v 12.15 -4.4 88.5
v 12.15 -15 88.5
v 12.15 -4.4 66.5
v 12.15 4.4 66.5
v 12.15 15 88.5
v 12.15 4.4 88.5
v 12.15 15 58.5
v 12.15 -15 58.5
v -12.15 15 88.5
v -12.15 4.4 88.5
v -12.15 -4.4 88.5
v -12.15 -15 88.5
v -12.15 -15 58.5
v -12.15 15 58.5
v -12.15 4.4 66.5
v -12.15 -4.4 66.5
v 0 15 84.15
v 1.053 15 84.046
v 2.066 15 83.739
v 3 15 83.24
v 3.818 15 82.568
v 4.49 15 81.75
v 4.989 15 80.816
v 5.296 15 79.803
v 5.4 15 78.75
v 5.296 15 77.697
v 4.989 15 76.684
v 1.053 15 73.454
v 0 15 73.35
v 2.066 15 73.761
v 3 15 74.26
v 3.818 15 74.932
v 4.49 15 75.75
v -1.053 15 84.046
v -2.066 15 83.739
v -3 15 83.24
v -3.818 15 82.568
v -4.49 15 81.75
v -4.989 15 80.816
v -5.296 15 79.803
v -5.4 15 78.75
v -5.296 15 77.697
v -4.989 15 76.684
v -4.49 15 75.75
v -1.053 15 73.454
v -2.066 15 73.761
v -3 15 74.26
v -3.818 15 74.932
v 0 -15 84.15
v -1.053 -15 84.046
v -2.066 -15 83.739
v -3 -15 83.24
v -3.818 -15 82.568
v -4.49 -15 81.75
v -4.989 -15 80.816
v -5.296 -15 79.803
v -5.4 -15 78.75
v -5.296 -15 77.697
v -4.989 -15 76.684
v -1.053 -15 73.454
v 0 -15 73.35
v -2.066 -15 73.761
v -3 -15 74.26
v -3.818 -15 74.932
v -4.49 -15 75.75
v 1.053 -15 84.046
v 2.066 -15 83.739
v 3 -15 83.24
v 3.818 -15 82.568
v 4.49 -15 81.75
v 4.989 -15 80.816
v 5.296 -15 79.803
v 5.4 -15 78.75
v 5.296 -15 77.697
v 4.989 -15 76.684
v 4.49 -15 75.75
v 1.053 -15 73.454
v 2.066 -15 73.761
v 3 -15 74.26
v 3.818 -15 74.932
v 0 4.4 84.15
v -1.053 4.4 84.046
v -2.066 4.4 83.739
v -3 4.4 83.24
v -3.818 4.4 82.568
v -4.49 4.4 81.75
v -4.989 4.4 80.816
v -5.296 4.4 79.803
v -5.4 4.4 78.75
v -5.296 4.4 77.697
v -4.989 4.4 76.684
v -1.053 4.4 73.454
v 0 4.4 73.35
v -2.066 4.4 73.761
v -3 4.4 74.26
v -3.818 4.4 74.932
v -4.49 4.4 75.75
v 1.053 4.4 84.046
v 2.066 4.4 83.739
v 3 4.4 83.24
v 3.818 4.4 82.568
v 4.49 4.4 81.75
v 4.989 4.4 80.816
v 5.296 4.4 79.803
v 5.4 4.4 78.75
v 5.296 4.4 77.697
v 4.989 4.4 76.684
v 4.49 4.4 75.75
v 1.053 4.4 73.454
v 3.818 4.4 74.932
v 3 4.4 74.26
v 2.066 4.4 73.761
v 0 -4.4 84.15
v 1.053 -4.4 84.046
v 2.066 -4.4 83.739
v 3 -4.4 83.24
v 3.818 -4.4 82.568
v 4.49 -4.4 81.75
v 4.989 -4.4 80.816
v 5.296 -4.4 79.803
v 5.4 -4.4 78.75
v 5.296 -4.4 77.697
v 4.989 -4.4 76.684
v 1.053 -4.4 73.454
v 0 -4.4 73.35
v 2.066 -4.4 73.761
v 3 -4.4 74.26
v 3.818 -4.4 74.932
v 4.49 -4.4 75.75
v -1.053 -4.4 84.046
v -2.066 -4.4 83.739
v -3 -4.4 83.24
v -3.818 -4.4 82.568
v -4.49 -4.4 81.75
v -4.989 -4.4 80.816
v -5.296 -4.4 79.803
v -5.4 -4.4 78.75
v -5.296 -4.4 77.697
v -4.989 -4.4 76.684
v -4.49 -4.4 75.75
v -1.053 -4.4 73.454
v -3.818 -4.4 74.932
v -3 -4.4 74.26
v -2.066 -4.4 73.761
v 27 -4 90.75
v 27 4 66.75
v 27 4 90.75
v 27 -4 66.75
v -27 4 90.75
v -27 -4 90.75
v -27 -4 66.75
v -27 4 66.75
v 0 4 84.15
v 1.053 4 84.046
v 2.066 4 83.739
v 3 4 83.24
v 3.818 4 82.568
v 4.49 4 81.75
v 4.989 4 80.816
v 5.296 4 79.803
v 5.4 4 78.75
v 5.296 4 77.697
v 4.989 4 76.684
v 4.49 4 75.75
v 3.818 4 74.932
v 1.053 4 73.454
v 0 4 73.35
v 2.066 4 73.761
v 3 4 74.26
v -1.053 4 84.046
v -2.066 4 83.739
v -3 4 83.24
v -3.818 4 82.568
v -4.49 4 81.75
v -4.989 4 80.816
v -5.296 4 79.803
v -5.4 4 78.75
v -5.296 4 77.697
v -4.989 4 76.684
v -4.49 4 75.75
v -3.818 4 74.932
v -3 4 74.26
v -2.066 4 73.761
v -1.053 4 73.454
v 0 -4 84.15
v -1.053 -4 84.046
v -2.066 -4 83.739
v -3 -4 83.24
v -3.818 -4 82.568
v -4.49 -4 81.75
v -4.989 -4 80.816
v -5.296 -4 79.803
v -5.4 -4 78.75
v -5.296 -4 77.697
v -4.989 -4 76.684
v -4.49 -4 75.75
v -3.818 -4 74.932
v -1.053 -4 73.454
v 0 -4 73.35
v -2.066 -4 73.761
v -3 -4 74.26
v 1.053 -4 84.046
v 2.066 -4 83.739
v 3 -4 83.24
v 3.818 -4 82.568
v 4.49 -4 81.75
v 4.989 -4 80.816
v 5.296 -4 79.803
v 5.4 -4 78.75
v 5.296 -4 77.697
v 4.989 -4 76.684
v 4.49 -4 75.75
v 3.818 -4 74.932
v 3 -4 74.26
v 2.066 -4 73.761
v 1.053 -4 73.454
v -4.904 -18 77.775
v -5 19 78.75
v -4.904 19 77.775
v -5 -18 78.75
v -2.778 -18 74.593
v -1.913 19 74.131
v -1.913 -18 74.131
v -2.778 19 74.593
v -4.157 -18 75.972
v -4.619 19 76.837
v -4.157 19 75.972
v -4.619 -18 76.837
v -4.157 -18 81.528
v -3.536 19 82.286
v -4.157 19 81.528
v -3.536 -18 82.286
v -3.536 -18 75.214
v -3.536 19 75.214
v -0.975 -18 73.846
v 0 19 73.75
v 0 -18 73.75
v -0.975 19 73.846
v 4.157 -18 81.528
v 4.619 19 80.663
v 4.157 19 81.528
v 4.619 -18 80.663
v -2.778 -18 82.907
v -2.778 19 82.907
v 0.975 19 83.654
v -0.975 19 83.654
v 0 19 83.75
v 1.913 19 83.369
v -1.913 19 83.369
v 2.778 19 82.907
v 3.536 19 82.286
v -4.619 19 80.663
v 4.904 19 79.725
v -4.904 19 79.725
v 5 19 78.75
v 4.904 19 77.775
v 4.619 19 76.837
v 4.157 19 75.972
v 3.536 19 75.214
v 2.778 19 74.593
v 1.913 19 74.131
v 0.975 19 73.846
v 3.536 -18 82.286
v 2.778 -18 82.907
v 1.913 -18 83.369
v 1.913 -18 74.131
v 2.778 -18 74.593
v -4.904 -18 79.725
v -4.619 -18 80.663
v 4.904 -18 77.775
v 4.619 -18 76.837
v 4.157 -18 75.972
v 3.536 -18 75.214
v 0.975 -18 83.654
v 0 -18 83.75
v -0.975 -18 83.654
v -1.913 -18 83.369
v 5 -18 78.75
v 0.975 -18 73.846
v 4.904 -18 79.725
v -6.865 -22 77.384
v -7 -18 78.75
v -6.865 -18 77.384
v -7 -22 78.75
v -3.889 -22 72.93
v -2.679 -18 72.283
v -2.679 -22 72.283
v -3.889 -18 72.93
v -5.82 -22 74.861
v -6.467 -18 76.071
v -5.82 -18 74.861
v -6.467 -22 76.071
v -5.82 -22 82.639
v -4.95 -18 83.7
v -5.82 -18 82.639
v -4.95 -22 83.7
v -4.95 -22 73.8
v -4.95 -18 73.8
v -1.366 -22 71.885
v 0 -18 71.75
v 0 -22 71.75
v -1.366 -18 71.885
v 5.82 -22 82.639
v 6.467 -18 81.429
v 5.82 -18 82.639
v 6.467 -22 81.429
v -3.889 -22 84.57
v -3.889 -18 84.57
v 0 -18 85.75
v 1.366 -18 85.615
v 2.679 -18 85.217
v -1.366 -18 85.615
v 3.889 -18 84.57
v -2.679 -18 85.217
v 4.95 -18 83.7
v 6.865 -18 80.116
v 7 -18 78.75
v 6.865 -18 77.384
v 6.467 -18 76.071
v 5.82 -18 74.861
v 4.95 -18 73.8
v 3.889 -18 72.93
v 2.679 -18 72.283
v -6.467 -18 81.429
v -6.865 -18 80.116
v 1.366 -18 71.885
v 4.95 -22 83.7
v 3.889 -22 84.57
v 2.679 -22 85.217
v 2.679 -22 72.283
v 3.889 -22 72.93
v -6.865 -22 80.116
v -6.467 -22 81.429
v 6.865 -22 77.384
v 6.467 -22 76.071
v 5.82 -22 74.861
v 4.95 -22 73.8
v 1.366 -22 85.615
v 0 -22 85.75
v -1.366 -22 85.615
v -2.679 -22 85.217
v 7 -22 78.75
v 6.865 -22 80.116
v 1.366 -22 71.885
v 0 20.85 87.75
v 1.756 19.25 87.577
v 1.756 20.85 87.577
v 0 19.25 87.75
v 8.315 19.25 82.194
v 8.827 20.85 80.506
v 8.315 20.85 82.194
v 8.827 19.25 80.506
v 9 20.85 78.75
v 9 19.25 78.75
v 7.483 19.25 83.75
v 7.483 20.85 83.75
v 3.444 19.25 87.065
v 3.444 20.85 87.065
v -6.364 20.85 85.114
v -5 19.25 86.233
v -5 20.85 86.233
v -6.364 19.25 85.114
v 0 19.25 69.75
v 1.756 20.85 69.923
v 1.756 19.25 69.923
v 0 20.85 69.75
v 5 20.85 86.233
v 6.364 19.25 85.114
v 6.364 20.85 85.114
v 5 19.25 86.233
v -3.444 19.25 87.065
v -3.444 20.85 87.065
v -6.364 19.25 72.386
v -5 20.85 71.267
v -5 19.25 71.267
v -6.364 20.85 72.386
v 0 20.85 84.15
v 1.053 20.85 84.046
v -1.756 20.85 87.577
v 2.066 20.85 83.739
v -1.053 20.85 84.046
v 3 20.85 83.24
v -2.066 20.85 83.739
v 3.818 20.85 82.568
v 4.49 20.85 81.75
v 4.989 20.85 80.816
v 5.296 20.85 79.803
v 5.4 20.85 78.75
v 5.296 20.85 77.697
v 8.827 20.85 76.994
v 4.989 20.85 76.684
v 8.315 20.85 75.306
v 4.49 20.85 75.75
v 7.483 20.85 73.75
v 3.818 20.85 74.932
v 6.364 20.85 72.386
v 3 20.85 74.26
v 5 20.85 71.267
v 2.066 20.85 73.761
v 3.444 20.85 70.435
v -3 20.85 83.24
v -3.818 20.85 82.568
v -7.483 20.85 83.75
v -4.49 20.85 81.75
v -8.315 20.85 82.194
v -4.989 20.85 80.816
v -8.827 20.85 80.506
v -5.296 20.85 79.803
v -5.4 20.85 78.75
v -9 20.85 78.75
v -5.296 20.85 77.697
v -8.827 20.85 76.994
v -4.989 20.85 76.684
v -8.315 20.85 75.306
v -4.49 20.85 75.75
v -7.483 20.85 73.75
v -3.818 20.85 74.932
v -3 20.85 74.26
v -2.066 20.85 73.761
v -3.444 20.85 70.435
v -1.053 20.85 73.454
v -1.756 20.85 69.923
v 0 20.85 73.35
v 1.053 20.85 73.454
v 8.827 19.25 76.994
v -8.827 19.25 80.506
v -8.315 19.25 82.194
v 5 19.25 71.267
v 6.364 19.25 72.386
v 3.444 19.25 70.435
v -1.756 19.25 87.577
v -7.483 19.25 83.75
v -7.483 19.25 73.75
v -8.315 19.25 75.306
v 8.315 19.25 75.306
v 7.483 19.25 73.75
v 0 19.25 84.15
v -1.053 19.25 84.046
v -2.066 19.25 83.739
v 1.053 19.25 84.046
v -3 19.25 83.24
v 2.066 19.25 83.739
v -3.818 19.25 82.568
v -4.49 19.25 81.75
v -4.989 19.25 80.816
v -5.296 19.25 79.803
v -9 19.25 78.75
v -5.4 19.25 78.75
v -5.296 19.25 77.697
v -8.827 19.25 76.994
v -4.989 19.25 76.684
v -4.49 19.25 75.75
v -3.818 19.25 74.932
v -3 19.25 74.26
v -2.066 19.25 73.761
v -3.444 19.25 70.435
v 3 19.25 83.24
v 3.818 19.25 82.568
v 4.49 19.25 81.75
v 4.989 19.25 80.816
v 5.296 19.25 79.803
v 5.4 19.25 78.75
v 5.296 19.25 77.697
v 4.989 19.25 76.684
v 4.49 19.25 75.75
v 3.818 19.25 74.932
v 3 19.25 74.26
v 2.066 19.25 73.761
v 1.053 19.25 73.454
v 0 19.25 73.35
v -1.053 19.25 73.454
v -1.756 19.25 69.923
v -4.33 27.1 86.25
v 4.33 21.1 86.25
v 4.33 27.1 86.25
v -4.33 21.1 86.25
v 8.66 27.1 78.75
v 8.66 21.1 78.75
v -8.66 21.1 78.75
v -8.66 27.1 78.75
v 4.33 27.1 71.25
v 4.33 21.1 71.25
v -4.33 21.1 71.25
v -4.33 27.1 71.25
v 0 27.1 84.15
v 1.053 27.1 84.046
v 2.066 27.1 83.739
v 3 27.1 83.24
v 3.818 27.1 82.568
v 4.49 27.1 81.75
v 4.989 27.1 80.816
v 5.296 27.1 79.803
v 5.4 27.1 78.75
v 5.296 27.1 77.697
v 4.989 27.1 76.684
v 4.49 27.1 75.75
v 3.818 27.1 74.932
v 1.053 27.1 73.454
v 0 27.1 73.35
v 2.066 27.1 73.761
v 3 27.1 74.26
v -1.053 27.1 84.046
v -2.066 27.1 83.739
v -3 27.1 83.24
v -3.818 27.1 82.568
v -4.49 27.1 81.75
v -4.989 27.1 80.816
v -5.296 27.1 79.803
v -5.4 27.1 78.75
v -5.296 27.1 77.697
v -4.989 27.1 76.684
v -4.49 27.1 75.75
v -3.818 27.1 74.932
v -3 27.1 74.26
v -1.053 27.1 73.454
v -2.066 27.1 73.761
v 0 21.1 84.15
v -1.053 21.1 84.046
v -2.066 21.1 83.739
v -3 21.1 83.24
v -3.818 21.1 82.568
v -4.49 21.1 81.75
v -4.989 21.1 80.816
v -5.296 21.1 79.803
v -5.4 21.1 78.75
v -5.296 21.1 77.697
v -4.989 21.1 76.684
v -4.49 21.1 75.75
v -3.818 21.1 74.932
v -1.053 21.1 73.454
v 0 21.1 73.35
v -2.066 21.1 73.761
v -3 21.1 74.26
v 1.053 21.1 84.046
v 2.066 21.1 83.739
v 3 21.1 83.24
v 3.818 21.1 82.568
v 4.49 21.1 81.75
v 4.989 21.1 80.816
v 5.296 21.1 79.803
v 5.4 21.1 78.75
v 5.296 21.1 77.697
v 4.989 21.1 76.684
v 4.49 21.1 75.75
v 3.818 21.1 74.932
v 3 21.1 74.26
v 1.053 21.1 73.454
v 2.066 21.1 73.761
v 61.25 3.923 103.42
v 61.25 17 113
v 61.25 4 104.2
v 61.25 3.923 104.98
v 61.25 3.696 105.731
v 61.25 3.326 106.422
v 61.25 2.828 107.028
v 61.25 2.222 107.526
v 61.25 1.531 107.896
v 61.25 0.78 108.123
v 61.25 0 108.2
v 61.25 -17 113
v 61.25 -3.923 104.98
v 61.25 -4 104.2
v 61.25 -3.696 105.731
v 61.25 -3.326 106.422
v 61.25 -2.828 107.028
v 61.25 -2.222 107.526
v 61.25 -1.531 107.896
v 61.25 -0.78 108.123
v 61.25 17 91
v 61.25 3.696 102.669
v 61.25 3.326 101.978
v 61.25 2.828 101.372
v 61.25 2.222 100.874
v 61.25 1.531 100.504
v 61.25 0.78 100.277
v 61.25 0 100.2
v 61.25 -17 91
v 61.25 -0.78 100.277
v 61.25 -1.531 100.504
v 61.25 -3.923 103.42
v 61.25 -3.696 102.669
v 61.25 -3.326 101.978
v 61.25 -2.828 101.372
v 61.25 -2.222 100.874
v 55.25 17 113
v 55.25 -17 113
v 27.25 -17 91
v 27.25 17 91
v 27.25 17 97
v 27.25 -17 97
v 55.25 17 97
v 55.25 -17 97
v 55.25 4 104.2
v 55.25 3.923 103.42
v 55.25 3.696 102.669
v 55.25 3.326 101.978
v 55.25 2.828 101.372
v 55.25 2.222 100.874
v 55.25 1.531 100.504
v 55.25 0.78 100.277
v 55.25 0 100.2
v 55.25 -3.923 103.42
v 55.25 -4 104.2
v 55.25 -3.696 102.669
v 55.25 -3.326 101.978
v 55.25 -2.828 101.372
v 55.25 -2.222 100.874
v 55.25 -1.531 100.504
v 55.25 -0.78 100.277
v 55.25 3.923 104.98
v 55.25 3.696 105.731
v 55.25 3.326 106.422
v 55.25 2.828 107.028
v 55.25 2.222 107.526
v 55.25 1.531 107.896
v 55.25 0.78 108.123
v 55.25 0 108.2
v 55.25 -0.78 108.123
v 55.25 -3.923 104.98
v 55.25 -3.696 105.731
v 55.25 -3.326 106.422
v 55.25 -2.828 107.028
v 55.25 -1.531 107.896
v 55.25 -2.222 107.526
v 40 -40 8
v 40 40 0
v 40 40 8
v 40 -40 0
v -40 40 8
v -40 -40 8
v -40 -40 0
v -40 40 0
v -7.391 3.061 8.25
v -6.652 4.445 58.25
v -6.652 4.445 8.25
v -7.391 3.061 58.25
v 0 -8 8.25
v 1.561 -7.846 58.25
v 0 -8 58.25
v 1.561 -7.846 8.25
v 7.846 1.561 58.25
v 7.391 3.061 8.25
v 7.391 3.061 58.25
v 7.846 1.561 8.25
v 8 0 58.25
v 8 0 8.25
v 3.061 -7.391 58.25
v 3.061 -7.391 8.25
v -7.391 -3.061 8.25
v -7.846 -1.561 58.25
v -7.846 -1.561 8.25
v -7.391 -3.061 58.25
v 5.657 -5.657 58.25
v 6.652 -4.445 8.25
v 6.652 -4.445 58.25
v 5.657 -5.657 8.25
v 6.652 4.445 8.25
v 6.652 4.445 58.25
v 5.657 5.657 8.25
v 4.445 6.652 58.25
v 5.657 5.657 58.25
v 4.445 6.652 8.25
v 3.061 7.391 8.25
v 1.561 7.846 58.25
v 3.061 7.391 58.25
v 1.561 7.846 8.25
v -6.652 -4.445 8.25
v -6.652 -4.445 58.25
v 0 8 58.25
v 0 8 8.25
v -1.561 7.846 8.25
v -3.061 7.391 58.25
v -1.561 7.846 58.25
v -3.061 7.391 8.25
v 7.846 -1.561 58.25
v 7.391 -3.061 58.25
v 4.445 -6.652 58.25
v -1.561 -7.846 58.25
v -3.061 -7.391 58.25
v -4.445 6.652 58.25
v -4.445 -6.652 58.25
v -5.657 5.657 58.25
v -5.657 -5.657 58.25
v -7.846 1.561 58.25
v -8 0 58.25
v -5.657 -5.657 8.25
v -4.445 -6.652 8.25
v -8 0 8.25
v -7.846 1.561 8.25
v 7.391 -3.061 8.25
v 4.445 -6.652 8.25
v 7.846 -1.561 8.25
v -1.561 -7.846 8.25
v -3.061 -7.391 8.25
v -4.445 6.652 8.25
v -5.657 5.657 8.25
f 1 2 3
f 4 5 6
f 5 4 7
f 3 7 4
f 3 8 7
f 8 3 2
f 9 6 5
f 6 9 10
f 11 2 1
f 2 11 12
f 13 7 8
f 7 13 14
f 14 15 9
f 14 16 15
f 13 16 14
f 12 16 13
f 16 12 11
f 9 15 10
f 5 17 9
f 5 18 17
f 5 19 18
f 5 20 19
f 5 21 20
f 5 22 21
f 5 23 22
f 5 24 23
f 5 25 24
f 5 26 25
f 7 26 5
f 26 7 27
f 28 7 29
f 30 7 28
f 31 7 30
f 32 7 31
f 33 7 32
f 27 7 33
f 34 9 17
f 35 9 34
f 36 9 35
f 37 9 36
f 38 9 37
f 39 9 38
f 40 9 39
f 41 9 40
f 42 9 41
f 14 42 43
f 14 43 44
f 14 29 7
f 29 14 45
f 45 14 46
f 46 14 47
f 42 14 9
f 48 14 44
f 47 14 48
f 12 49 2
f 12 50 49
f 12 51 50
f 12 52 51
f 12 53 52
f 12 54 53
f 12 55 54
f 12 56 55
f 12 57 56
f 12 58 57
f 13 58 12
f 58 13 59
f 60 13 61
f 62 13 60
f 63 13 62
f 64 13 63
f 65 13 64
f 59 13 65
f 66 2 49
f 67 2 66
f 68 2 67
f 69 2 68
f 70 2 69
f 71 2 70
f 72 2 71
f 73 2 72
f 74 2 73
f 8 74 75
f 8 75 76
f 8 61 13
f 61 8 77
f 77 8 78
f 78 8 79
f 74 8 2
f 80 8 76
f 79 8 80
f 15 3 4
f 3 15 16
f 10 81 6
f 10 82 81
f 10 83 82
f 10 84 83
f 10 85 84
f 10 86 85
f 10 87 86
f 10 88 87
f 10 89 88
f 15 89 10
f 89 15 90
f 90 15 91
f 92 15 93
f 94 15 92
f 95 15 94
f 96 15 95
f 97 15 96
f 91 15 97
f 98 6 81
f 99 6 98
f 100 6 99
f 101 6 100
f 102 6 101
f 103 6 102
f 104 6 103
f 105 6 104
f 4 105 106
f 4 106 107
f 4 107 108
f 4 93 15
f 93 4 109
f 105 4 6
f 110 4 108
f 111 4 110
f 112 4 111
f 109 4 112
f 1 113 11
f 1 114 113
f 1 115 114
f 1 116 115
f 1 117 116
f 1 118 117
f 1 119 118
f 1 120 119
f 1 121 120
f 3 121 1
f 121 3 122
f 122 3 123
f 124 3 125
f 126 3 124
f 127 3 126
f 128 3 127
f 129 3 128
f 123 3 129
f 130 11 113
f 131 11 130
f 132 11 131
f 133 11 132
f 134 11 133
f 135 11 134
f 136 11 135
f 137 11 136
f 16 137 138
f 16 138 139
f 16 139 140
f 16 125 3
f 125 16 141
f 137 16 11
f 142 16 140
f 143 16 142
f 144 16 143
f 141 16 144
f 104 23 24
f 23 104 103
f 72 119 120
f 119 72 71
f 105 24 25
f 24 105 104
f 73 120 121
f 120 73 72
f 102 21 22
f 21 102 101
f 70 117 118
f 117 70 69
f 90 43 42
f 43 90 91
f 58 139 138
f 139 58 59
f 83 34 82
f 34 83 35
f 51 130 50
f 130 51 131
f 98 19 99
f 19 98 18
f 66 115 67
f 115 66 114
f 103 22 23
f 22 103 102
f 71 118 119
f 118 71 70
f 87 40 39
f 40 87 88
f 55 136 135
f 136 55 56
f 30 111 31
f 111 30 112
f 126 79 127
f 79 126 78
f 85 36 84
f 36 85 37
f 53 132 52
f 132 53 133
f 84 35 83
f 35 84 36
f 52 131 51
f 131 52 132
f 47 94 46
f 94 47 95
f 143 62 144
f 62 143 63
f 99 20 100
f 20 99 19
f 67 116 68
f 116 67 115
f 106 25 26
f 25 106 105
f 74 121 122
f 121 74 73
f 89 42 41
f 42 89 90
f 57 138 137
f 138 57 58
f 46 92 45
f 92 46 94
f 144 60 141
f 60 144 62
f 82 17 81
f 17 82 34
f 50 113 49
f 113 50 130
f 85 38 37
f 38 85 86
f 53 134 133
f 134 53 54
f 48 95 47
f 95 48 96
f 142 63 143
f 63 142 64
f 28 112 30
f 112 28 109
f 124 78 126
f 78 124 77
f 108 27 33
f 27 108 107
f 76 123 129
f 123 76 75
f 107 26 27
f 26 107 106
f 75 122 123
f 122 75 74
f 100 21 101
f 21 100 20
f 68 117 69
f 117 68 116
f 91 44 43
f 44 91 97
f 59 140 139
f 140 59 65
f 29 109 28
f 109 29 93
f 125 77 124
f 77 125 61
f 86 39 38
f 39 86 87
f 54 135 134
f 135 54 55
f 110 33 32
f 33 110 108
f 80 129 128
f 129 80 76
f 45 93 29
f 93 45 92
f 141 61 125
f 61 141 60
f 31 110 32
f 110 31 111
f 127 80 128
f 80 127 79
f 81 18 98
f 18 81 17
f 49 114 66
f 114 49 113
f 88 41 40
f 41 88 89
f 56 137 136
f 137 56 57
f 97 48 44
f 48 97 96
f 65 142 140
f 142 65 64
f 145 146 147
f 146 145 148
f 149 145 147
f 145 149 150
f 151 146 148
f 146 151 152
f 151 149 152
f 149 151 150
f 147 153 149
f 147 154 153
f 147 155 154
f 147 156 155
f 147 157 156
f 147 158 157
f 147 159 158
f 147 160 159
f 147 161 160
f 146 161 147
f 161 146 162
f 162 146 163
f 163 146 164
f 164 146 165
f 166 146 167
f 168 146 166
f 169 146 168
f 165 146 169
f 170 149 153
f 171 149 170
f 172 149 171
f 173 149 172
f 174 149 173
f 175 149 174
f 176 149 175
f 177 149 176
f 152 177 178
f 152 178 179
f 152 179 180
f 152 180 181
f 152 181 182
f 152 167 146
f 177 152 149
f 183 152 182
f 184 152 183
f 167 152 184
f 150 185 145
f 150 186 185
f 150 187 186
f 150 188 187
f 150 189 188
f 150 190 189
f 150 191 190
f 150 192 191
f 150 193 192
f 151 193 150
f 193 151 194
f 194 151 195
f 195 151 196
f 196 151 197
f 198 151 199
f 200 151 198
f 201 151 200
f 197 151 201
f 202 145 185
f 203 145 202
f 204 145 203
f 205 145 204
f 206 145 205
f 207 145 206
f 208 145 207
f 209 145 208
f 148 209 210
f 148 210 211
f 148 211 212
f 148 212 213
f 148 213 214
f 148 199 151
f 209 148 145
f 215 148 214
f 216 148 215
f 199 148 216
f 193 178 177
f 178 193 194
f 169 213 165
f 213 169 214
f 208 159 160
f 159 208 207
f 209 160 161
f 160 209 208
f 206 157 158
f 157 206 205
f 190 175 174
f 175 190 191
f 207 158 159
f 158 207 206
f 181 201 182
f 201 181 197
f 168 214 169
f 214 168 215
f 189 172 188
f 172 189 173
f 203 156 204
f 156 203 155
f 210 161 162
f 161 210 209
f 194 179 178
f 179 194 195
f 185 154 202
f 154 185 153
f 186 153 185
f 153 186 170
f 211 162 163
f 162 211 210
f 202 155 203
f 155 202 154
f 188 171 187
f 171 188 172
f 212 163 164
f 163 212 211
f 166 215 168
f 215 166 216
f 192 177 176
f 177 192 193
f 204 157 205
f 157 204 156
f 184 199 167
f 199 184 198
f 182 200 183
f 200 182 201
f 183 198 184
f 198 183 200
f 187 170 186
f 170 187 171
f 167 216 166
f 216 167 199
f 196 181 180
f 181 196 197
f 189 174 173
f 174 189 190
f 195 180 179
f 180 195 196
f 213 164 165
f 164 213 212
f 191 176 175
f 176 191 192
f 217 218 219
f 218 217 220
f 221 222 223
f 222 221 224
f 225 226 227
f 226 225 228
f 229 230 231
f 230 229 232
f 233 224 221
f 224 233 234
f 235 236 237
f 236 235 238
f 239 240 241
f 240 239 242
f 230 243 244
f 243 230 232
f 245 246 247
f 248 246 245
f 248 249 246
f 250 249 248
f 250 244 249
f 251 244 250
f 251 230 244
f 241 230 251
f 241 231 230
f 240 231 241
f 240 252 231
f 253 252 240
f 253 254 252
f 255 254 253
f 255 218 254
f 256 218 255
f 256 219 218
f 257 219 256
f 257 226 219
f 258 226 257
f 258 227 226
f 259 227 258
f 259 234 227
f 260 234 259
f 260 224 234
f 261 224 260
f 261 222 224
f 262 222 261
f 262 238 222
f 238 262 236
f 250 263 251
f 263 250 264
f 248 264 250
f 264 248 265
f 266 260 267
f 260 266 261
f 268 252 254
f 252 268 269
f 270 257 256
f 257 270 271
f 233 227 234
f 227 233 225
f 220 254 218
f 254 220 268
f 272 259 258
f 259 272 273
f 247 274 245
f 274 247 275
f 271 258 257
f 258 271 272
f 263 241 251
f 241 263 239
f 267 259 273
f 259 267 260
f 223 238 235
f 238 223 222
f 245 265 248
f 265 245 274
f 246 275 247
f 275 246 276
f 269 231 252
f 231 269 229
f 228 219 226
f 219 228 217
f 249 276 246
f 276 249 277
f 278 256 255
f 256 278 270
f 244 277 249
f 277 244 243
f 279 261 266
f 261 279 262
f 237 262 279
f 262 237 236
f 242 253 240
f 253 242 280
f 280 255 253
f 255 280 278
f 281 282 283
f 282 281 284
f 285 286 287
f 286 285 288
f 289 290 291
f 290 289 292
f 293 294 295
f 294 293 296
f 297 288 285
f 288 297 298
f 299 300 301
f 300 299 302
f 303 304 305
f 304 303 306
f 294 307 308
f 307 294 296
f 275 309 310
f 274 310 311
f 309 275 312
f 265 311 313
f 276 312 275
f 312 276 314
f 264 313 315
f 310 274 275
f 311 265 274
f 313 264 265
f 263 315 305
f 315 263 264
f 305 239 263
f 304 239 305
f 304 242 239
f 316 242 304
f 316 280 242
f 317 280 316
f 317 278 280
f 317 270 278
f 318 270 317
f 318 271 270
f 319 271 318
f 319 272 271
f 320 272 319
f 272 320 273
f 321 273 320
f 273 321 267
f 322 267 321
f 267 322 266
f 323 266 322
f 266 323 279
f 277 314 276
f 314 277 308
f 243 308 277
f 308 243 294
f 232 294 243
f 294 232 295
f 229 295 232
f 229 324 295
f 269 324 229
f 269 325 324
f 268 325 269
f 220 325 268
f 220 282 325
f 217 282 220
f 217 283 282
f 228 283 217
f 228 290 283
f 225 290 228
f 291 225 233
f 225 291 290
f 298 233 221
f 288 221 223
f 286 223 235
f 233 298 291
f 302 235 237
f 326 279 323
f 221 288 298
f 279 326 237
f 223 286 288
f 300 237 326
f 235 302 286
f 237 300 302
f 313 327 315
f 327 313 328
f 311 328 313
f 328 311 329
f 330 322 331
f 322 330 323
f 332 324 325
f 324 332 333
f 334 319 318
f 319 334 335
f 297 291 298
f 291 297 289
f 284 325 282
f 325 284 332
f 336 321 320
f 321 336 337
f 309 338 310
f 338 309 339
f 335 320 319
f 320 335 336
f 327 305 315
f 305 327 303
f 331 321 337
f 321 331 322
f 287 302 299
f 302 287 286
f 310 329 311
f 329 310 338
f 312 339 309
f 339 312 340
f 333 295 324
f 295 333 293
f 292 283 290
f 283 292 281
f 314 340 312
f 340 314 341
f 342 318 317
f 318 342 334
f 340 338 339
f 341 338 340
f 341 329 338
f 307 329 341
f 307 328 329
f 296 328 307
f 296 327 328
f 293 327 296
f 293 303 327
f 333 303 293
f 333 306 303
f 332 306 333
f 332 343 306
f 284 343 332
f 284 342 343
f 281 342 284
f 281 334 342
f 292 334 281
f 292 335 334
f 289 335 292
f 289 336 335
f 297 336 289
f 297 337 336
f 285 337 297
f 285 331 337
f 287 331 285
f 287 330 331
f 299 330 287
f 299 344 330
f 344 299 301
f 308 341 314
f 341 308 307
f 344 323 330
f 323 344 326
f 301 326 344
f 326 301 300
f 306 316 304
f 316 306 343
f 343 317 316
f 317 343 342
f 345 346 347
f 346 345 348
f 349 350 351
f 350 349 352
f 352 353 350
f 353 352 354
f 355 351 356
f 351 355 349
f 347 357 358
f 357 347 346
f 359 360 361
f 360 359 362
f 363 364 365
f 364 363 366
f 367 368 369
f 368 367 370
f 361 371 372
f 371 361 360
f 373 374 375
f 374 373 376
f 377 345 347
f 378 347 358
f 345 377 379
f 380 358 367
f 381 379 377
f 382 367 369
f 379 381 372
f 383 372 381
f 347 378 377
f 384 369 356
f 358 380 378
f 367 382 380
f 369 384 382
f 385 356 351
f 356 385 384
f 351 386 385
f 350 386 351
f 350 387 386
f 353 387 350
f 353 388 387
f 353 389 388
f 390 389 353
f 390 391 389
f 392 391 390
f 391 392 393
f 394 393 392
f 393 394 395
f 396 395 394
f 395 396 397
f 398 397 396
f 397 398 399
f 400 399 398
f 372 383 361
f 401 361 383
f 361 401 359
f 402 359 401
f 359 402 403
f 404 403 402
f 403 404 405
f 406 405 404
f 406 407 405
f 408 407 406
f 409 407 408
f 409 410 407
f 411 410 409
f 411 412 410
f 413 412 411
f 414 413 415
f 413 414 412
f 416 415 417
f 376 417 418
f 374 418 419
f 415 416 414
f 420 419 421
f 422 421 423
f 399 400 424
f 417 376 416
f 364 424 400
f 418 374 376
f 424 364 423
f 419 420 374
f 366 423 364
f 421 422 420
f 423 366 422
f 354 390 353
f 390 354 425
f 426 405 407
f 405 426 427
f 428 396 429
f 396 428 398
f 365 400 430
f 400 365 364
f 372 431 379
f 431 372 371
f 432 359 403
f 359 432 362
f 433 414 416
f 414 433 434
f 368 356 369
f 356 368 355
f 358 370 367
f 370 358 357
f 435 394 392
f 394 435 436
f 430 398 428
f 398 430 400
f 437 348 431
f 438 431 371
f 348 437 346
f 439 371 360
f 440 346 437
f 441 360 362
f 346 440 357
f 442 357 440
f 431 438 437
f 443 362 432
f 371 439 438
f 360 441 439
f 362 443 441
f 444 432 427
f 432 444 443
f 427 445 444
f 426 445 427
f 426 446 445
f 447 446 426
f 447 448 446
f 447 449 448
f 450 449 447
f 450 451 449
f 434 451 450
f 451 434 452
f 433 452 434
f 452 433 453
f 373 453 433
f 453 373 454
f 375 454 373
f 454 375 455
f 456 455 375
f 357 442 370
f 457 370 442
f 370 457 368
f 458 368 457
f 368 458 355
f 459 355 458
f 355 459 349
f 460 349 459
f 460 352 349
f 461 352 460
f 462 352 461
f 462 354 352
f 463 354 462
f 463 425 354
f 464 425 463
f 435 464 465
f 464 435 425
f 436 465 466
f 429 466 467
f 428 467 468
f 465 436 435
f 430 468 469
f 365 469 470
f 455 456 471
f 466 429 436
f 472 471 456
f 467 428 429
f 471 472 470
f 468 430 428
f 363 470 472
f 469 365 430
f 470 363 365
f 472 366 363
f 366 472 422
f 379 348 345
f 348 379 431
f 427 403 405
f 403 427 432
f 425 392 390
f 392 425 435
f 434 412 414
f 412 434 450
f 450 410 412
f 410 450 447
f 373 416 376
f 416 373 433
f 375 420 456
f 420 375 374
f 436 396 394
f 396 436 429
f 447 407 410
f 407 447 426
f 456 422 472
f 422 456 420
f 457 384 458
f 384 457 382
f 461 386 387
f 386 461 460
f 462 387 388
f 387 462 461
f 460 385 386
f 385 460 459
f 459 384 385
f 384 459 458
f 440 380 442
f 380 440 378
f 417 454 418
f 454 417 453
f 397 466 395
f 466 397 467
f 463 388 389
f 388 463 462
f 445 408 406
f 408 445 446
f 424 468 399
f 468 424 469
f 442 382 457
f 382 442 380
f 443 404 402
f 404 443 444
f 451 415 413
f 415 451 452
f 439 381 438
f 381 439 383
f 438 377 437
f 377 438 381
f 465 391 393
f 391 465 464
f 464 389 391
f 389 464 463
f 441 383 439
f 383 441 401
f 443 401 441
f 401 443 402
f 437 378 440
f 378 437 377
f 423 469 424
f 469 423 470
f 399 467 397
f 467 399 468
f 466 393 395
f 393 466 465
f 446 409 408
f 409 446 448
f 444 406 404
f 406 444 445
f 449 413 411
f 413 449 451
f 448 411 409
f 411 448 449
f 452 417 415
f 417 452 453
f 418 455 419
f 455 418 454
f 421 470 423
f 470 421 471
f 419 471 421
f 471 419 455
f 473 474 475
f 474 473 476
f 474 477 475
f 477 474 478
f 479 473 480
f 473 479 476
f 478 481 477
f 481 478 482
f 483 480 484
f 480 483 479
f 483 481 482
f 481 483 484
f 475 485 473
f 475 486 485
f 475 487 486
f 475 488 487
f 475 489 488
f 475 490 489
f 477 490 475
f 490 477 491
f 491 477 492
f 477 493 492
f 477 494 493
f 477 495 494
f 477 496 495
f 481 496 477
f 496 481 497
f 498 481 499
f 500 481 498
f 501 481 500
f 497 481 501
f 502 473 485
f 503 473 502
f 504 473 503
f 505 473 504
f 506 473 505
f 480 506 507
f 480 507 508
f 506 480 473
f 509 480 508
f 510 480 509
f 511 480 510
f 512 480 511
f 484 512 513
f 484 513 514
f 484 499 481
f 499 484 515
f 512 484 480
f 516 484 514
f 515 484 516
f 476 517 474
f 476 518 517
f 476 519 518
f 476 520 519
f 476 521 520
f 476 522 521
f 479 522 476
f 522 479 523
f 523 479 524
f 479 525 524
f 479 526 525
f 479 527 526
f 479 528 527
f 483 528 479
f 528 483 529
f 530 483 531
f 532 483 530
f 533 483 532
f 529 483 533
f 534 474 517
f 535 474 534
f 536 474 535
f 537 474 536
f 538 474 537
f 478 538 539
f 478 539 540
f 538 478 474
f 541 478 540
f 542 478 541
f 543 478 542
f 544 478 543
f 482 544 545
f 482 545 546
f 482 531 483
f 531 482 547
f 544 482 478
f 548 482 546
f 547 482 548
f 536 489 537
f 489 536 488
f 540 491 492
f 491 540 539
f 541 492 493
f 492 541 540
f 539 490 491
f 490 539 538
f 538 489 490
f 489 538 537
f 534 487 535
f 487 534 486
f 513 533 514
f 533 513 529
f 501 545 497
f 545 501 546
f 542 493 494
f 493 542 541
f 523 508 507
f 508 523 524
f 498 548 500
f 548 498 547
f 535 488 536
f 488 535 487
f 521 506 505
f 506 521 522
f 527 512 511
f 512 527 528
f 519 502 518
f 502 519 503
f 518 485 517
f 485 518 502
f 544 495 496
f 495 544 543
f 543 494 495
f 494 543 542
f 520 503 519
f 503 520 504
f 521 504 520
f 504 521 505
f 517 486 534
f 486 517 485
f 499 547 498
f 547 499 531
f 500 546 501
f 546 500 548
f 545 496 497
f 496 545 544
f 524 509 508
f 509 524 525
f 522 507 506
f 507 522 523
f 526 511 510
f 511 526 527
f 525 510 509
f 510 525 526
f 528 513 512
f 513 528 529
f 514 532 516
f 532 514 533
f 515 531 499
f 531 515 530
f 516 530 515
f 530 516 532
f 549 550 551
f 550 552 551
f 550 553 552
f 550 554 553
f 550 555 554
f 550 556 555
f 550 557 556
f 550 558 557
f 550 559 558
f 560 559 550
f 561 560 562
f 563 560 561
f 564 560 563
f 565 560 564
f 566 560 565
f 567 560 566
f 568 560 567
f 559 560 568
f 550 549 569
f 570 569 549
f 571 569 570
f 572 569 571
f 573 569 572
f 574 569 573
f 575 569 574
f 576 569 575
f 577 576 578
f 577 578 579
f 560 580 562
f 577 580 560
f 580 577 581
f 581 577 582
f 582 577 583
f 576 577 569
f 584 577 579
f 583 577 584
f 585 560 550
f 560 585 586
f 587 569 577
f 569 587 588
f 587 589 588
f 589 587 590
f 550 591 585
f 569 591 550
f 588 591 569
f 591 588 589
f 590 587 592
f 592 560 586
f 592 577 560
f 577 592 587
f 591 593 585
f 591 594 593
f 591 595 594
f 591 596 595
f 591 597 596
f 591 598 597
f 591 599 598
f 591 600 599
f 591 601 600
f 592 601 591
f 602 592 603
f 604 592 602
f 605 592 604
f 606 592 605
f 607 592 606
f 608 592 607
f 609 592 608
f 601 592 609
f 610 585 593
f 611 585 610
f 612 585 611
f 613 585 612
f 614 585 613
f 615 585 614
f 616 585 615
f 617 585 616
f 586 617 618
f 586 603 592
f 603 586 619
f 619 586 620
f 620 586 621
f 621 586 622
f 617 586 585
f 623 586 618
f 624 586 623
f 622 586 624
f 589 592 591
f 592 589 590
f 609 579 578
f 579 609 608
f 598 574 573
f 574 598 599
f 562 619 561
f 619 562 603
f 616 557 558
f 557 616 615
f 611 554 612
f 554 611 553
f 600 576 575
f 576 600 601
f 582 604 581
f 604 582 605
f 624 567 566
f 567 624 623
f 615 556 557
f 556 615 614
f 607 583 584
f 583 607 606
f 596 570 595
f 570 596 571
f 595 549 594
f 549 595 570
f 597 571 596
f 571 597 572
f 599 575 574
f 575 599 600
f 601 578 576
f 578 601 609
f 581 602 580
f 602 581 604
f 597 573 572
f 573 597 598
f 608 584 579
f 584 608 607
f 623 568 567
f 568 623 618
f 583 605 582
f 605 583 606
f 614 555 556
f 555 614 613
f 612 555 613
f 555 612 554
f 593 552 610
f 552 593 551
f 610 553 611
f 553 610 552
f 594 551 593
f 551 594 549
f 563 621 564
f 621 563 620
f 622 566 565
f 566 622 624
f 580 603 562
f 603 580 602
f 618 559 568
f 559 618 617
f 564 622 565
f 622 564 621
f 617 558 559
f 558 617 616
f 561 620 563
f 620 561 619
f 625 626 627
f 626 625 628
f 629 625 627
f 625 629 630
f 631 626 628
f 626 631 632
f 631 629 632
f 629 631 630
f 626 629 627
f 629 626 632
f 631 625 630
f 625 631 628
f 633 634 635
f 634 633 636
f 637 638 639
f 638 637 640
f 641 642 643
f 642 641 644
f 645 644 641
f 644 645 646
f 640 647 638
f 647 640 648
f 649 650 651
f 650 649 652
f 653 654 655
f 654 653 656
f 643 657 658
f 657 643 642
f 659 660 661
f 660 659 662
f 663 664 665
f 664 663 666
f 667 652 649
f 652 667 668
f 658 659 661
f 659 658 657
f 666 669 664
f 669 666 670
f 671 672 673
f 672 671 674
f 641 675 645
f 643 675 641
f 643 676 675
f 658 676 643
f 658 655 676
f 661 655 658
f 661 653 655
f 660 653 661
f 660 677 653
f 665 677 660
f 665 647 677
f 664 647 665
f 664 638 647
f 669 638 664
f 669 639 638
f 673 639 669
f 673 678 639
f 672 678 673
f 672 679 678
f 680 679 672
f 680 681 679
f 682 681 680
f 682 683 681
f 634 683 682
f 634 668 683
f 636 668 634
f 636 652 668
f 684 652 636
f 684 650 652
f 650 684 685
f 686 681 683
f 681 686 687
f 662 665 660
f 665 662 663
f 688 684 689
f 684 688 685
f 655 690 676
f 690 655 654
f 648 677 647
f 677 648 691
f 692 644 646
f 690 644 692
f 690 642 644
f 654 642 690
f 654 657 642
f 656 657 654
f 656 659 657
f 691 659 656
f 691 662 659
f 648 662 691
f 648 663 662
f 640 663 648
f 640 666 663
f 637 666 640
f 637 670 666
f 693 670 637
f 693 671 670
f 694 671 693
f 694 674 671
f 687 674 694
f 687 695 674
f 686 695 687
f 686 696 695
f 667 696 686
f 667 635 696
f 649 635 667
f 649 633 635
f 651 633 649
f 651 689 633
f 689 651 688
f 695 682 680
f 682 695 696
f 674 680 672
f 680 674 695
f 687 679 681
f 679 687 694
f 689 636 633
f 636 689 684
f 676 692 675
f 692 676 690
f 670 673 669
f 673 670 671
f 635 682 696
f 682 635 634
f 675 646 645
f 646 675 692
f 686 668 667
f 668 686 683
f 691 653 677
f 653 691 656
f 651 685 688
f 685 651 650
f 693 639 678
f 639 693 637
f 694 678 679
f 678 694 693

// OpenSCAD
$fn = 32;

// ------------------------------------------------------------------------
// Lamp arm: column d16 x 50 mm, arm 54 mm
// Every part is its own module, assembly() places every instance.
// ------------------------------------------------------------------------

// --- part 1 ---
module lamp_base() {
  difference() {
    translate([-40, -40, 0]) cube([80, 80, 8]);
  }
}

// --- part 2 ---
module lamp_column() {
  cylinder(h = 50, d = 16);
}

// --- part 3 ---
module head_fork() {
  difference() {
    translate([-12.15, -15, 0]) cube([24.3, 30, 30]);
    translate([-13.15, -4.4, 8]) cube([26.3, 8.8, 23]);
    translate([0, 0, 20.25]) rotate([90, 0, 0]) cylinder(h = 32, d = 10.8, center = true);
  }
}

// --- part 4 ---
module lamp_arm() {
  difference() {
    translate([-27, -4, 0]) cube([54, 8, 24]);
    translate([0, 0, 12]) rotate([90, 0, 0]) cylinder(h = 10, d = 10.8, center = true);
  }
}

// --- part 5 ---
module arm_pin() {
  rotate([0, 90, 0]) cylinder(h = 38, d = 10, center = true);
  translate([-22, 0, 0]) rotate([0, 90, 0]) cylinder(h = 4, d = 14);
}

// --- part 6 ---
module arm_washer() {
  difference() {
      translate([0, 0, 0]) cylinder(h = 1.6, d = 18);
      translate([0, 0, -1]) cylinder(h = 3.6, d = 10.8);
    }
}

// --- part 7 ---
module arm_nut() {
  difference() {
    linear_extrude(height = 6) polygon(points = [[8.66, 0], [4.33, 7.5], [-4.33, 7.5], [-8.66, 0], [-4.33, -7.5], [4.33, -7.5]]);
    translate([0, 0, -1]) cylinder(h = 8, d = 10.8);
  }
}

// --- part 8 ---
module shade_bracket() {
  difference() {
    translate([-17, -17, 0]) cube([34, 34, 22]);
    translate([-18, -18, 6]) cube([29, 36, 17]);
    translate([14, 0, 13.2]) rotate([0, 90, 0]) cylinder(h = 8, d = 8, center = true);
  }
}

// --- assembly ---
module assembly() {
  color([0.80, 0.24, 0.20]) translate([0, 0, 0]) rotate([0, 0, 0]) lamp_base();
  color([0.20, 0.45, 0.75]) translate([0, 0, 8.25]) rotate([0, 0, 0]) lamp_column();
  color([0.25, 0.62, 0.32]) translate([0, 0, 58.5]) rotate([0, 0, 0]) head_fork();
  color([0.92, 0.70, 0.18]) translate([0, 0, 66.75]) rotate([0, 0, 0]) lamp_arm();
  color([0.58, 0.35, 0.70]) translate([0, 0, 78.75]) rotate([0, 0, 90]) arm_pin();
  color([0.16, 0.66, 0.66]) translate([0, 20.85, 78.75]) rotate([90, 0, 0]) arm_washer();
  color([0.85, 0.48, 0.18]) translate([0, 27.1, 78.75]) rotate([90, 0, 0]) arm_nut();
  color([0.55, 0.60, 0.65]) translate([44.25, 0, 91]) rotate([0, 0, 0]) shade_bracket();
}

assembly();
